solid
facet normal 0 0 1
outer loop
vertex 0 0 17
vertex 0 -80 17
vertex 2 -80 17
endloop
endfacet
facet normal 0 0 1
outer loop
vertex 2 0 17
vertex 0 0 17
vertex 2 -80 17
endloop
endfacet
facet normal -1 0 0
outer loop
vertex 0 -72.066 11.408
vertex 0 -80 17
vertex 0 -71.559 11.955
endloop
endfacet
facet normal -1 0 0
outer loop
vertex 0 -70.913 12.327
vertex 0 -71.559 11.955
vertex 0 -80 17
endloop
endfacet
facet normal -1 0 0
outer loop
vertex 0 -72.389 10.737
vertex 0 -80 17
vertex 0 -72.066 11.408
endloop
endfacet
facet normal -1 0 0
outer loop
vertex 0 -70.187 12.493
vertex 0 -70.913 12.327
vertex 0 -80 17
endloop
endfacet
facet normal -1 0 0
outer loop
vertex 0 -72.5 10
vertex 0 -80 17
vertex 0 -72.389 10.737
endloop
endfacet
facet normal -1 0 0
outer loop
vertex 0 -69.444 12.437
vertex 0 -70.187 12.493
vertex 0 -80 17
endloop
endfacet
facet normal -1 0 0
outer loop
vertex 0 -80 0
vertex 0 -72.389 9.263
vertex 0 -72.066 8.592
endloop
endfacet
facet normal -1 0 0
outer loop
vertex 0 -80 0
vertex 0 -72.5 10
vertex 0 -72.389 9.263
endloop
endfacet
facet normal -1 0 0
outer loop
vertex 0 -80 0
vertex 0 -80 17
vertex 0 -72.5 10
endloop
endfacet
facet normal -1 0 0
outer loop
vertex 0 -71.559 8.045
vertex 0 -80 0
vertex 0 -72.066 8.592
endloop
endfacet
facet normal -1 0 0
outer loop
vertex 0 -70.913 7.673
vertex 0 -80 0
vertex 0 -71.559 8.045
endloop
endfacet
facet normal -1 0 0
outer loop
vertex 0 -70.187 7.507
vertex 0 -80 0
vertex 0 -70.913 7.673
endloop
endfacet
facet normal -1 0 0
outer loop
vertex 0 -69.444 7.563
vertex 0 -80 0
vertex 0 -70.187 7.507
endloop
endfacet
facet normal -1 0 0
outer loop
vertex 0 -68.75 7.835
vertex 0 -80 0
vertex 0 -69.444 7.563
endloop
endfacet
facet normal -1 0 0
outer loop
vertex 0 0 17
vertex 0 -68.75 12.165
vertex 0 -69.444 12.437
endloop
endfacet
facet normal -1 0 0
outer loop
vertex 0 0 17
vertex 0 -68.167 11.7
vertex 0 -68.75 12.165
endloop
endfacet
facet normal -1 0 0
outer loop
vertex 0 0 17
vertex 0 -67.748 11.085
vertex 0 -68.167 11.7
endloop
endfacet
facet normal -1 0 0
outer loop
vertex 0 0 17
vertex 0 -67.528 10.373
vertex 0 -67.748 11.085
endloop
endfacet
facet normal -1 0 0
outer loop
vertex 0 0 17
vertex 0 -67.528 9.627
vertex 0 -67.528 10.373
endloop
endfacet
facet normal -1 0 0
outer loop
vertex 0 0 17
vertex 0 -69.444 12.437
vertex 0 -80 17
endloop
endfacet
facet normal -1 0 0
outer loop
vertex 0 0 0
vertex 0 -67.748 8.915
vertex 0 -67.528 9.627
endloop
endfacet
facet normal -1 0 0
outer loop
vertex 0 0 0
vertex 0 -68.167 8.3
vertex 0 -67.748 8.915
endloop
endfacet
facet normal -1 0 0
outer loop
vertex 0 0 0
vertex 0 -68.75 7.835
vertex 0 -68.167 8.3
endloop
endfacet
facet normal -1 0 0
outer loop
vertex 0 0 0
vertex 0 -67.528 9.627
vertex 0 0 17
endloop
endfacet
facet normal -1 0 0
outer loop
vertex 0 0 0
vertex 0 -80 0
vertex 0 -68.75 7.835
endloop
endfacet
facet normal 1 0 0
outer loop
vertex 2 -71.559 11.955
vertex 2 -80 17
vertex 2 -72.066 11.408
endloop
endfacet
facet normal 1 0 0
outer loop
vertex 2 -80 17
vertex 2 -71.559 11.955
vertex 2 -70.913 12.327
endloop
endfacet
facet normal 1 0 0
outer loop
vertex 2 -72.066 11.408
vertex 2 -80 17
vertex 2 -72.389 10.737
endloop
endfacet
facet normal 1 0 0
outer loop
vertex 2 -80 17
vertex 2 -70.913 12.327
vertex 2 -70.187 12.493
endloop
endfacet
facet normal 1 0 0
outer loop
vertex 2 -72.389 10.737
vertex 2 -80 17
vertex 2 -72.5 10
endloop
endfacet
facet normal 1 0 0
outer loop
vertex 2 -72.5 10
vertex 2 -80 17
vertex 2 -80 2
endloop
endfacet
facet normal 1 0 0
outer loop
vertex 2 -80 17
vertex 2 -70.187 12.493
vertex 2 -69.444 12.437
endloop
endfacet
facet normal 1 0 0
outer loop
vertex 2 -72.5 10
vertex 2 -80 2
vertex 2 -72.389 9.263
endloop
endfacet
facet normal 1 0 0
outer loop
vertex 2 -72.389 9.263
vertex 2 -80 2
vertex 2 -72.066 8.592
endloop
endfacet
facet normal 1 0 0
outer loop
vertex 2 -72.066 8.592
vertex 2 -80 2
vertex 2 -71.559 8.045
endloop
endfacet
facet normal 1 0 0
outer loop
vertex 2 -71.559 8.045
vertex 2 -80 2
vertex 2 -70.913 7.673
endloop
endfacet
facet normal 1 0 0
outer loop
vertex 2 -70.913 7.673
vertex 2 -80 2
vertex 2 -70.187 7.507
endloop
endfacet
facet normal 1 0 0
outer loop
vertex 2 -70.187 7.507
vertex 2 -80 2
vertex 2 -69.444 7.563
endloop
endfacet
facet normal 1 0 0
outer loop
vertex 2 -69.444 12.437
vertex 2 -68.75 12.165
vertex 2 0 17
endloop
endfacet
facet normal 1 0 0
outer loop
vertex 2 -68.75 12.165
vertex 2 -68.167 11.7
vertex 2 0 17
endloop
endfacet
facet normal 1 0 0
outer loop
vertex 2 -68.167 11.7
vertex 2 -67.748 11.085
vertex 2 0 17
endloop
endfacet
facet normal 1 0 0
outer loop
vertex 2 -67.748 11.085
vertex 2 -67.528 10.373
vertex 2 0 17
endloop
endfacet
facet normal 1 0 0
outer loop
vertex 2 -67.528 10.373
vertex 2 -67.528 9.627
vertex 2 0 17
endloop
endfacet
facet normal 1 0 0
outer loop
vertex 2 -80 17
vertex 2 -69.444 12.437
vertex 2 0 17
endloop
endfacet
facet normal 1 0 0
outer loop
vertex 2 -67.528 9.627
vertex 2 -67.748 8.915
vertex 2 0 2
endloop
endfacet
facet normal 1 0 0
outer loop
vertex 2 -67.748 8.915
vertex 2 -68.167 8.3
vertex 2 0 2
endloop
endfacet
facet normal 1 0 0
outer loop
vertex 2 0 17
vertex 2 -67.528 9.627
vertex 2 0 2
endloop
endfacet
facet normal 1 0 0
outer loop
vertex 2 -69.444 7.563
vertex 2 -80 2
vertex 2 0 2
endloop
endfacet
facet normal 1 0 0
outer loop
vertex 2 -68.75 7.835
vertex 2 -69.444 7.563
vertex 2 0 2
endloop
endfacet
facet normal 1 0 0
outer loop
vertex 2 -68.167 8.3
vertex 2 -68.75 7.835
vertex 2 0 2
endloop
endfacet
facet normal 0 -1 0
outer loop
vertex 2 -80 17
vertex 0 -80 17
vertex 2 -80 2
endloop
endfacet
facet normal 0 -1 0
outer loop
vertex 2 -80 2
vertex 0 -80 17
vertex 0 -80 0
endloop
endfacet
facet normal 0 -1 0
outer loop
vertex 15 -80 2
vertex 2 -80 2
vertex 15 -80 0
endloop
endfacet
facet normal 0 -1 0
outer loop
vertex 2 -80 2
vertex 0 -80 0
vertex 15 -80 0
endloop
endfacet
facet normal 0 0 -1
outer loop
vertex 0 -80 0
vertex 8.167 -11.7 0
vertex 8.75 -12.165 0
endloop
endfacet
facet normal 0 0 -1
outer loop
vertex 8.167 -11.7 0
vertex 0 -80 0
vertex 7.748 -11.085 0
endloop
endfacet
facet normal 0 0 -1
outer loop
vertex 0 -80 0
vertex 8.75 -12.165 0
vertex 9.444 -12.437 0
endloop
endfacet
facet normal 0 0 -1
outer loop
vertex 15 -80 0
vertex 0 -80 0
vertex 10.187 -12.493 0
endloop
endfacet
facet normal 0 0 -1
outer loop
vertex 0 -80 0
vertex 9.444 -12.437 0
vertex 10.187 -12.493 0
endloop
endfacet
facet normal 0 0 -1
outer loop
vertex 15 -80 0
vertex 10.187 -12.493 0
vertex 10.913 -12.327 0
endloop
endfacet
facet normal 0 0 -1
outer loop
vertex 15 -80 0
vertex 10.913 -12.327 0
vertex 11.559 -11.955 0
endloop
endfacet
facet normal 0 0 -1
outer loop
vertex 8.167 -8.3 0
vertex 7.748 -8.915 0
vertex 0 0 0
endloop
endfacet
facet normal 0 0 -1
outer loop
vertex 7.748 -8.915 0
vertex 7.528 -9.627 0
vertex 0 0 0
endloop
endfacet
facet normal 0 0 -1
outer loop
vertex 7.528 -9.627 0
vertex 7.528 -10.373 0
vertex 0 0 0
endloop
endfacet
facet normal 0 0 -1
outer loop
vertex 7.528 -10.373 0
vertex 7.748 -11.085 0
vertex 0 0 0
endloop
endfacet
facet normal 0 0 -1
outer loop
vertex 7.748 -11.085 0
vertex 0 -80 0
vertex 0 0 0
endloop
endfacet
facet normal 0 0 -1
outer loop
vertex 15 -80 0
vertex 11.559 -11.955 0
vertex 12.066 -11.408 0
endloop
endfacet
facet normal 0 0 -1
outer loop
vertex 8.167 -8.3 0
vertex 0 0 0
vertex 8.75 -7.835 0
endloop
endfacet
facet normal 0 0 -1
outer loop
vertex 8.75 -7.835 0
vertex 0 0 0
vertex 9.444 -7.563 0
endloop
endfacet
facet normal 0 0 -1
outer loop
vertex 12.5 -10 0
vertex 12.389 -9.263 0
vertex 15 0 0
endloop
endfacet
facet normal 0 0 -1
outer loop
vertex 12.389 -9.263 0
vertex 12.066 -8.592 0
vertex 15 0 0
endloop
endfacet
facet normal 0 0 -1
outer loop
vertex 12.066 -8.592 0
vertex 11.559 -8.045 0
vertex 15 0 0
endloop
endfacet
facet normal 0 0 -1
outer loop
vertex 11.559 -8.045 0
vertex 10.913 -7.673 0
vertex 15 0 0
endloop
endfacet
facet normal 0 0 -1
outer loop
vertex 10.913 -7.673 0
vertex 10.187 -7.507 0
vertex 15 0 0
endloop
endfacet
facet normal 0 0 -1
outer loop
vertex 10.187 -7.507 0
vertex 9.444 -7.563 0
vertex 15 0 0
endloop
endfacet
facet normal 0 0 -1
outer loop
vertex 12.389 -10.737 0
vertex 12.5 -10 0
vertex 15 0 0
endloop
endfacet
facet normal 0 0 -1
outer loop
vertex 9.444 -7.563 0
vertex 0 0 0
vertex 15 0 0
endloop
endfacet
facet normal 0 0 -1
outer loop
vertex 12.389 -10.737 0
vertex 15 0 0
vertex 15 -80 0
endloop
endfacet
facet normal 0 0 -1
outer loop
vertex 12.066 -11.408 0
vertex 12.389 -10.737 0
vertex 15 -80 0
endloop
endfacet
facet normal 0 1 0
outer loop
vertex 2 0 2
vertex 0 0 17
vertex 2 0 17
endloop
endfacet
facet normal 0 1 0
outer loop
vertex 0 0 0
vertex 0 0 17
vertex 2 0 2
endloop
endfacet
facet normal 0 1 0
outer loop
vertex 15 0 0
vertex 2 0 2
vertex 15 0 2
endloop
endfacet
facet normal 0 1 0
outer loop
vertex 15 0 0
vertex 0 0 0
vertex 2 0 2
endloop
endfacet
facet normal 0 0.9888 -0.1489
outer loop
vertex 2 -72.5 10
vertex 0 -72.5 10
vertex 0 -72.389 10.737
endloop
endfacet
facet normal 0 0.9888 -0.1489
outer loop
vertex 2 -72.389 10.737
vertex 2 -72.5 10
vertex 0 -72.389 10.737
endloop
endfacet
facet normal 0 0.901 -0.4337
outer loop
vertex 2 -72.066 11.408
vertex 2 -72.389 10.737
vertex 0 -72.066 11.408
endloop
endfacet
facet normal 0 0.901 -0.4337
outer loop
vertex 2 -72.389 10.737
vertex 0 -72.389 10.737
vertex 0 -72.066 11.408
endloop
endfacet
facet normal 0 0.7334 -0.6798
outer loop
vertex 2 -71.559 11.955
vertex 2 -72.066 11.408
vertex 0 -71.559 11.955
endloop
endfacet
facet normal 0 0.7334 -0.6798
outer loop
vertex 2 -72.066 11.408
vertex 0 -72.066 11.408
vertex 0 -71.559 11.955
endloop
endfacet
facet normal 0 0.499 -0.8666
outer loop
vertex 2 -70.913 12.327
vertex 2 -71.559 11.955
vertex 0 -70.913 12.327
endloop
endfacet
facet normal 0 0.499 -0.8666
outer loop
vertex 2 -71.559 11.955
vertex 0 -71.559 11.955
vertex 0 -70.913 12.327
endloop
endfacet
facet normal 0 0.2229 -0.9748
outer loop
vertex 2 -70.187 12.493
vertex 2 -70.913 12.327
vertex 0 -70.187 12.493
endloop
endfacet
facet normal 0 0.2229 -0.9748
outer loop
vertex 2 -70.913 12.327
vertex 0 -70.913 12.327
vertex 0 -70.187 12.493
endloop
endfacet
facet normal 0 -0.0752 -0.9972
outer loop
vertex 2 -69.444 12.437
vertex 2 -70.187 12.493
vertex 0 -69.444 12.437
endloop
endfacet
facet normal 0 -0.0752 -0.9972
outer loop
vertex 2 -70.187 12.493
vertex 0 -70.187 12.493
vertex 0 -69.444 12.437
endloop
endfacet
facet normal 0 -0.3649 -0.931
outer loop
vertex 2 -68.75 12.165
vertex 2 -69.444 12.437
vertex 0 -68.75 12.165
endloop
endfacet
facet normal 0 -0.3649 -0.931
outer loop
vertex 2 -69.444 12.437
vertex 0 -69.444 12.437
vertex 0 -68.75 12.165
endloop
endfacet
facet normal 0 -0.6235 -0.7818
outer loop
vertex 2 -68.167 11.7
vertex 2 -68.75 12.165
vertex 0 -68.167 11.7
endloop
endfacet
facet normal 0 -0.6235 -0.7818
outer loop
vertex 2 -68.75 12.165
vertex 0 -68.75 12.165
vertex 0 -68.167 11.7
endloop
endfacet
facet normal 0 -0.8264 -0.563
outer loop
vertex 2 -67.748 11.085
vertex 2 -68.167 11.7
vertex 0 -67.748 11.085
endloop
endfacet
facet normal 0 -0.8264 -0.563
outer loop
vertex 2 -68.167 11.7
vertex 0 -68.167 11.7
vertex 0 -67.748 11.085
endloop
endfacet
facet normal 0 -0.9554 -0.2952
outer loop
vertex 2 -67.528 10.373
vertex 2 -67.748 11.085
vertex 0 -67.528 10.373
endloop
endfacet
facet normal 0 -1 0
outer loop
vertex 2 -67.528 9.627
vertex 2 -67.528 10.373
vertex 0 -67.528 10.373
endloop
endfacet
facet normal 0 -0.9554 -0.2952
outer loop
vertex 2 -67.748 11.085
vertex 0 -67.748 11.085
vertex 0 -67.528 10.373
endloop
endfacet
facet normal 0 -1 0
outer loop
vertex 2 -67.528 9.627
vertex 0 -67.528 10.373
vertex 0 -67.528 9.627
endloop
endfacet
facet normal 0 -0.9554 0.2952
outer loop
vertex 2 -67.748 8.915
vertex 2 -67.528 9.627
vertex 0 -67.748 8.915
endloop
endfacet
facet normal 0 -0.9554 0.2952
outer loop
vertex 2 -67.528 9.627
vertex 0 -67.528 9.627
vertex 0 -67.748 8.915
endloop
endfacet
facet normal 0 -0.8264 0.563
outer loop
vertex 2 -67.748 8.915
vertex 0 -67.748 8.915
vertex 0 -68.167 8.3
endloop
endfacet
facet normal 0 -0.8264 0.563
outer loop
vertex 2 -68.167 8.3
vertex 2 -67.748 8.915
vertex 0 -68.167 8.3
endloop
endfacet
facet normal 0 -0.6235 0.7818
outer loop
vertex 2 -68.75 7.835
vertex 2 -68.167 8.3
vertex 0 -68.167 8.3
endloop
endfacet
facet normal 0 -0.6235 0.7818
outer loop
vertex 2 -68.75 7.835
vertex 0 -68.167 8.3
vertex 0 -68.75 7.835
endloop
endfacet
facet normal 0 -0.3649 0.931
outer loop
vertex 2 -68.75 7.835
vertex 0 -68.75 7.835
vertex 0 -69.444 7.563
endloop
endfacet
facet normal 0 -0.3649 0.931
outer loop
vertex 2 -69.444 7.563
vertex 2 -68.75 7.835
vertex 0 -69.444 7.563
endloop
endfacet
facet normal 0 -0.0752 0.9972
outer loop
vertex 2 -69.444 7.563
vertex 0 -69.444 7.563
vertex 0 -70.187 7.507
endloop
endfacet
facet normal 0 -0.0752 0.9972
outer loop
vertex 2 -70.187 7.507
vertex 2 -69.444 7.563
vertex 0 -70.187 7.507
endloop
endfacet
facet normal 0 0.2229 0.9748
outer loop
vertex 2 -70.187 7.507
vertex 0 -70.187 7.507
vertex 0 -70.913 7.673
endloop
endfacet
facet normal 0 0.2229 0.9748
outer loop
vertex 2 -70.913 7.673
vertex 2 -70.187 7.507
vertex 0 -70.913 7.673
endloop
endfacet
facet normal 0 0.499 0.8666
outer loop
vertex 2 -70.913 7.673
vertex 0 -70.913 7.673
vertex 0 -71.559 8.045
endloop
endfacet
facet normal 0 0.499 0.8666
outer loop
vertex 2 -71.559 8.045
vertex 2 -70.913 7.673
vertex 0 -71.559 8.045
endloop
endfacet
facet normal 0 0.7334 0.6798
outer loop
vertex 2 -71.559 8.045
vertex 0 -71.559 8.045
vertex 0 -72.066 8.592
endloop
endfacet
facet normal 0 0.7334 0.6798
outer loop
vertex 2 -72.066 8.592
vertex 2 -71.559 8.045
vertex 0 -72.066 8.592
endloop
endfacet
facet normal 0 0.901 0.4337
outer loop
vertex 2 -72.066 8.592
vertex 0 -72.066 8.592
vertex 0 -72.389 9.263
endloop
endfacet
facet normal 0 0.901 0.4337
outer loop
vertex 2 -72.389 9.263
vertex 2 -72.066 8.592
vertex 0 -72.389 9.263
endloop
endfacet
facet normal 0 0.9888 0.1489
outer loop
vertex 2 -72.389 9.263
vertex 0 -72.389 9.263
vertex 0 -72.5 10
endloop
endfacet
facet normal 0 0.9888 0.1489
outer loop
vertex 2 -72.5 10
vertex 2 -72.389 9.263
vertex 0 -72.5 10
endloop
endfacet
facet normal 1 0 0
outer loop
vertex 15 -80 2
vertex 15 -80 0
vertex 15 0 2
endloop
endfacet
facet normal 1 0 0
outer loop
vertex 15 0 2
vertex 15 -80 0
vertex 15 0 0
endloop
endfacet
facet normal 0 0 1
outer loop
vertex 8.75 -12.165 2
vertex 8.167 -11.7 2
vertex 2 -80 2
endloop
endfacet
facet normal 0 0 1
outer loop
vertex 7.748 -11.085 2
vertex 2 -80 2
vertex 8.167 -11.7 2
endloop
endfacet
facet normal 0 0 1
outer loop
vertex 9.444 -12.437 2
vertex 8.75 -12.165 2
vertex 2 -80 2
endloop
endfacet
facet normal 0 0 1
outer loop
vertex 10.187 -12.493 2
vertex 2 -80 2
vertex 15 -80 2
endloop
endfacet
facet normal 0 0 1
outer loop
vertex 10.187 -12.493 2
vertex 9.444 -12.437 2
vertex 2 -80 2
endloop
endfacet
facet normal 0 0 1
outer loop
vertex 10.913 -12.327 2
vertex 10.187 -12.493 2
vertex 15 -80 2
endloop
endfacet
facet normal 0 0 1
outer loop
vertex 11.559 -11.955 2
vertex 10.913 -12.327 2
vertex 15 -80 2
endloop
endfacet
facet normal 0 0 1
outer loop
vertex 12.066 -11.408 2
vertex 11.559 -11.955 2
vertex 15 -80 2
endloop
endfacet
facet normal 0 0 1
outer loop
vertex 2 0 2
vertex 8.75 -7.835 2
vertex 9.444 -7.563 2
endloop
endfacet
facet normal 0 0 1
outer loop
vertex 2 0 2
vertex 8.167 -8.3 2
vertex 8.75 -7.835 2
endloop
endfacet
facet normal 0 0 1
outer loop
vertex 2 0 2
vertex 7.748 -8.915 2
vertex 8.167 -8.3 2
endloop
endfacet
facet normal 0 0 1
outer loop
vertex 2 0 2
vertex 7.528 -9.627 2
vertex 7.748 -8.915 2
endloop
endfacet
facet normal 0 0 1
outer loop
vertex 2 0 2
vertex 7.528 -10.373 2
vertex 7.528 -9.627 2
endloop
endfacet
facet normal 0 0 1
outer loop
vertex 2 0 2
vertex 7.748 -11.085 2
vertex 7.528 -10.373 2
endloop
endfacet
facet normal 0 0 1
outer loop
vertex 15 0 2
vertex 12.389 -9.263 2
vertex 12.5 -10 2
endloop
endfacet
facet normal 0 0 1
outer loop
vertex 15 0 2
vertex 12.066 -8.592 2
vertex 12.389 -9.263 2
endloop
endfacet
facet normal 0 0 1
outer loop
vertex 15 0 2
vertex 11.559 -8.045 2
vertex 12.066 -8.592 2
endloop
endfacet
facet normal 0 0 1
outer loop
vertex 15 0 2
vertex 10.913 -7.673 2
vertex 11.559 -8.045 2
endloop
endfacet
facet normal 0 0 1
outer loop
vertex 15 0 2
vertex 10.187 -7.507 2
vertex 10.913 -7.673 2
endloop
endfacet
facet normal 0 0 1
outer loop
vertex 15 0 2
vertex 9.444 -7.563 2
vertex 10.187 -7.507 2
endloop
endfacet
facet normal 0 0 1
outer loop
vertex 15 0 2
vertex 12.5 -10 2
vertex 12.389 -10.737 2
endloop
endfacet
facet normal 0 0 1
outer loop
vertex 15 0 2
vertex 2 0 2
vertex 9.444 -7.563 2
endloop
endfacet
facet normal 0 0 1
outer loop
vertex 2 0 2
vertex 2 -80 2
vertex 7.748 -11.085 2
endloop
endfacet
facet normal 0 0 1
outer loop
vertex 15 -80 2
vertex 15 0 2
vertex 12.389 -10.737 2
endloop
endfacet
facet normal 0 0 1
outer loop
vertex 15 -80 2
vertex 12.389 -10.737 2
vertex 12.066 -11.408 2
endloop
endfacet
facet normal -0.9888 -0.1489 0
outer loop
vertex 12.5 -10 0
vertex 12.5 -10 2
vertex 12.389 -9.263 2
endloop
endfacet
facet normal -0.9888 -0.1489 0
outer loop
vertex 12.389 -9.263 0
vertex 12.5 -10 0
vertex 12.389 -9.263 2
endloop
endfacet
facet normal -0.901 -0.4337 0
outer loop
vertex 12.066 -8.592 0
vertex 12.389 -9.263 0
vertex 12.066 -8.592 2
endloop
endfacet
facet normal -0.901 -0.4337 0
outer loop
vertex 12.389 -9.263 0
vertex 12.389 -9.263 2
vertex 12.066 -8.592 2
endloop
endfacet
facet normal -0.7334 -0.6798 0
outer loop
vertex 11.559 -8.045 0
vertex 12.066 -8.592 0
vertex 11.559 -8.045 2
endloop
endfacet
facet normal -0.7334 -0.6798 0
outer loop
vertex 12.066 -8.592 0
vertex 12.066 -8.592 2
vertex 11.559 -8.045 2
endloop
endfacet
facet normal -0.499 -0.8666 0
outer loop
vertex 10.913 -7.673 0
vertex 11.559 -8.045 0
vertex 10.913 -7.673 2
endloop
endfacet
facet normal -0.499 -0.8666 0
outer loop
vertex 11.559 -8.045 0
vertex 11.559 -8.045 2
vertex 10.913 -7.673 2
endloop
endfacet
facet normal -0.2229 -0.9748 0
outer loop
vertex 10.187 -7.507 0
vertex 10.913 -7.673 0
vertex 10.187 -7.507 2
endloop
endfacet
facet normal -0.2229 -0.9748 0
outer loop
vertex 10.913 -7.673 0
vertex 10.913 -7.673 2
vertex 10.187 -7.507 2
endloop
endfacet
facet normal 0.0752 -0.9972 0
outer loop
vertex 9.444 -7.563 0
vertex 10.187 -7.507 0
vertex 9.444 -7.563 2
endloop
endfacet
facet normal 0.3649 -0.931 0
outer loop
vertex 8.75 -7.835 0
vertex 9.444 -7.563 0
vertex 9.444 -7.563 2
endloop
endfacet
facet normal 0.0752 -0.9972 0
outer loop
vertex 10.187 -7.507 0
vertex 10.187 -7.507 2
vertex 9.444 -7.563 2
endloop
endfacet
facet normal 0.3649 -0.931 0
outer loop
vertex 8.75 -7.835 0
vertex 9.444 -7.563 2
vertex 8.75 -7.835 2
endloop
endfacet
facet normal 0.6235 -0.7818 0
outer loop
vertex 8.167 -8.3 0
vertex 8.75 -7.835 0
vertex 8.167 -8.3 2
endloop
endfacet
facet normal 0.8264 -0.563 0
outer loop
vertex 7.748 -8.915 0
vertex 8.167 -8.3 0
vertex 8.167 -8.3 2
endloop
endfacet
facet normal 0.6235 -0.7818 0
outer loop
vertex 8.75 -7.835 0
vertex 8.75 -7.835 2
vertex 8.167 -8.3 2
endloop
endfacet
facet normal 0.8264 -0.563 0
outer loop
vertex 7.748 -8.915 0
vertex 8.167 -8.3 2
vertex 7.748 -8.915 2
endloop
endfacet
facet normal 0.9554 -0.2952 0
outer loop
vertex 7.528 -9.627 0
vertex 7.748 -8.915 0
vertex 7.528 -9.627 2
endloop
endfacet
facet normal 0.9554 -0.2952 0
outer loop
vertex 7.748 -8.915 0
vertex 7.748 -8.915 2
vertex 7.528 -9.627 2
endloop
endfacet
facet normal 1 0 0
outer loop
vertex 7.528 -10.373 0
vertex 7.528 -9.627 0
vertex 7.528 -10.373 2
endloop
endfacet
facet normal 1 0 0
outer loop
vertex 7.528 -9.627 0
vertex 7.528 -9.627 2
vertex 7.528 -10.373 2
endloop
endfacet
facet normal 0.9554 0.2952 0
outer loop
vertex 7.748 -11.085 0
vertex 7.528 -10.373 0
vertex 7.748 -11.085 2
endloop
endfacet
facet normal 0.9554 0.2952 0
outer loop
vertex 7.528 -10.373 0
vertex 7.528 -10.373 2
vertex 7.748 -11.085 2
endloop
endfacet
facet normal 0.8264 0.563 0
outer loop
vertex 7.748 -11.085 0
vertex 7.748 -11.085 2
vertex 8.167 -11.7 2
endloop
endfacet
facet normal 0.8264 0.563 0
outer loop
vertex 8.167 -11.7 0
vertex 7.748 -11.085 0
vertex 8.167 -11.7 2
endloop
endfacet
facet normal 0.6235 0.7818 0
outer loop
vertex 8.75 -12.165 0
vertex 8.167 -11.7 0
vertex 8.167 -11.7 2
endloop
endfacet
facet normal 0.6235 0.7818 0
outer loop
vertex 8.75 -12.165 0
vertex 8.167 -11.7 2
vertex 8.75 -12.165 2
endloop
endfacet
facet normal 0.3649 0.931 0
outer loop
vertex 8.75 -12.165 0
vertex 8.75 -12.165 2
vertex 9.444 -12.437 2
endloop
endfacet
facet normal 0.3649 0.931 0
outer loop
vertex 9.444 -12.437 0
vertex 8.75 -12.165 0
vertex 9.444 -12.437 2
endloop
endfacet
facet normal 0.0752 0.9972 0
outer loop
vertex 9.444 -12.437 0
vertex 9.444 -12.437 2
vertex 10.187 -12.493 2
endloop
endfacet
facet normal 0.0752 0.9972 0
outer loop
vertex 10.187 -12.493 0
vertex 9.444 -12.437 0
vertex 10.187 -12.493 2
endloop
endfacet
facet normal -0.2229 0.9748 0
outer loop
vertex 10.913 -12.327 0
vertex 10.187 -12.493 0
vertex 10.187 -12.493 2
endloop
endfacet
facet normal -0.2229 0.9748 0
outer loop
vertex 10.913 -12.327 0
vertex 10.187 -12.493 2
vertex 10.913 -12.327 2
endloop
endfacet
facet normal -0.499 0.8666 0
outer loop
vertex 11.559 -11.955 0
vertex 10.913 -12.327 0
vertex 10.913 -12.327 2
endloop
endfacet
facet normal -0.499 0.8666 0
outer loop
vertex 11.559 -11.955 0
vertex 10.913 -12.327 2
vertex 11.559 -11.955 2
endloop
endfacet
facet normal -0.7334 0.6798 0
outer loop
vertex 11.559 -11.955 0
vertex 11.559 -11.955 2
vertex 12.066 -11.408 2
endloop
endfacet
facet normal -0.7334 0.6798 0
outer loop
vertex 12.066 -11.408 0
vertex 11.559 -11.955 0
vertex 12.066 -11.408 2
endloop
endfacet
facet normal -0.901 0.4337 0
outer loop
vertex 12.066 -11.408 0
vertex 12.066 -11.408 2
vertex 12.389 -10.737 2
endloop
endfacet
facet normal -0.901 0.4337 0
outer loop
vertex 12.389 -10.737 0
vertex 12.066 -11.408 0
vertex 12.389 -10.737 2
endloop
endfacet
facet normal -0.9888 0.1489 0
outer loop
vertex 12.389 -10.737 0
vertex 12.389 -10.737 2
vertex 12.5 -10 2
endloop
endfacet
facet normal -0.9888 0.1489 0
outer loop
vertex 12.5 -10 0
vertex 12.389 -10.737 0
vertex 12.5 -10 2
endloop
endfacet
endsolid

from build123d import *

# Parameters (mm, degrees)
ESQUISSE1_W             = 15
ESQUISSE1_H             = 80
BOSS_EXTRU_1_DEPTH      = 2
ESQUISSE2_W             = 2
ESQUISSE2_H             = 80
BOSS_EXTRU_2_DEPTH      = 15
ESQUISSE3_R             = 2.5
ENL_V_MAT_EXTRU_1_DEPTH = 20
ESQUISSE4_R             = 2.5
ENL_V_MAT_EXTRU_2_DEPTH = 20


with BuildPart() as part:
    # Esquisse1 → Boss.-Extru.1 (new body)
    with BuildSketch(Plane.XY):
        with Locations((7.5, -40)):
            Rectangle(ESQUISSE1_W, ESQUISSE1_H)
    extrude(amount=BOSS_EXTRU_1_DEPTH)

    # Esquisse2 → Boss.-Extru.2 (add)
    with BuildSketch(Plane.XY.offset(2)):
        with Locations((1, -40)):
            Rectangle(ESQUISSE2_W, ESQUISSE2_H)
    extrude(amount=BOSS_EXTRU_2_DEPTH)

    # Esquisse3 → Enlèv. mat.-Extru.1 (cut)
    with BuildSketch(Plane.XY.offset(2)):
        with Locations((10, -10)):
            Circle(ESQUISSE3_R)
    extrude(amount=-ENL_V_MAT_EXTRU_1_DEPTH, mode=Mode.SUBTRACT)

    # Esquisse4 → Enlèv. mat.-Extru.2 (cut)
    with BuildSketch(Plane.ZY):
        with Locations(Location((10, -70, 0), (0, 0, 270))):
            Circle(ESQUISSE4_R)
    extrude(amount=-ENL_V_MAT_EXTRU_2_DEPTH, mode=Mode.SUBTRACT)


solid = part.part
